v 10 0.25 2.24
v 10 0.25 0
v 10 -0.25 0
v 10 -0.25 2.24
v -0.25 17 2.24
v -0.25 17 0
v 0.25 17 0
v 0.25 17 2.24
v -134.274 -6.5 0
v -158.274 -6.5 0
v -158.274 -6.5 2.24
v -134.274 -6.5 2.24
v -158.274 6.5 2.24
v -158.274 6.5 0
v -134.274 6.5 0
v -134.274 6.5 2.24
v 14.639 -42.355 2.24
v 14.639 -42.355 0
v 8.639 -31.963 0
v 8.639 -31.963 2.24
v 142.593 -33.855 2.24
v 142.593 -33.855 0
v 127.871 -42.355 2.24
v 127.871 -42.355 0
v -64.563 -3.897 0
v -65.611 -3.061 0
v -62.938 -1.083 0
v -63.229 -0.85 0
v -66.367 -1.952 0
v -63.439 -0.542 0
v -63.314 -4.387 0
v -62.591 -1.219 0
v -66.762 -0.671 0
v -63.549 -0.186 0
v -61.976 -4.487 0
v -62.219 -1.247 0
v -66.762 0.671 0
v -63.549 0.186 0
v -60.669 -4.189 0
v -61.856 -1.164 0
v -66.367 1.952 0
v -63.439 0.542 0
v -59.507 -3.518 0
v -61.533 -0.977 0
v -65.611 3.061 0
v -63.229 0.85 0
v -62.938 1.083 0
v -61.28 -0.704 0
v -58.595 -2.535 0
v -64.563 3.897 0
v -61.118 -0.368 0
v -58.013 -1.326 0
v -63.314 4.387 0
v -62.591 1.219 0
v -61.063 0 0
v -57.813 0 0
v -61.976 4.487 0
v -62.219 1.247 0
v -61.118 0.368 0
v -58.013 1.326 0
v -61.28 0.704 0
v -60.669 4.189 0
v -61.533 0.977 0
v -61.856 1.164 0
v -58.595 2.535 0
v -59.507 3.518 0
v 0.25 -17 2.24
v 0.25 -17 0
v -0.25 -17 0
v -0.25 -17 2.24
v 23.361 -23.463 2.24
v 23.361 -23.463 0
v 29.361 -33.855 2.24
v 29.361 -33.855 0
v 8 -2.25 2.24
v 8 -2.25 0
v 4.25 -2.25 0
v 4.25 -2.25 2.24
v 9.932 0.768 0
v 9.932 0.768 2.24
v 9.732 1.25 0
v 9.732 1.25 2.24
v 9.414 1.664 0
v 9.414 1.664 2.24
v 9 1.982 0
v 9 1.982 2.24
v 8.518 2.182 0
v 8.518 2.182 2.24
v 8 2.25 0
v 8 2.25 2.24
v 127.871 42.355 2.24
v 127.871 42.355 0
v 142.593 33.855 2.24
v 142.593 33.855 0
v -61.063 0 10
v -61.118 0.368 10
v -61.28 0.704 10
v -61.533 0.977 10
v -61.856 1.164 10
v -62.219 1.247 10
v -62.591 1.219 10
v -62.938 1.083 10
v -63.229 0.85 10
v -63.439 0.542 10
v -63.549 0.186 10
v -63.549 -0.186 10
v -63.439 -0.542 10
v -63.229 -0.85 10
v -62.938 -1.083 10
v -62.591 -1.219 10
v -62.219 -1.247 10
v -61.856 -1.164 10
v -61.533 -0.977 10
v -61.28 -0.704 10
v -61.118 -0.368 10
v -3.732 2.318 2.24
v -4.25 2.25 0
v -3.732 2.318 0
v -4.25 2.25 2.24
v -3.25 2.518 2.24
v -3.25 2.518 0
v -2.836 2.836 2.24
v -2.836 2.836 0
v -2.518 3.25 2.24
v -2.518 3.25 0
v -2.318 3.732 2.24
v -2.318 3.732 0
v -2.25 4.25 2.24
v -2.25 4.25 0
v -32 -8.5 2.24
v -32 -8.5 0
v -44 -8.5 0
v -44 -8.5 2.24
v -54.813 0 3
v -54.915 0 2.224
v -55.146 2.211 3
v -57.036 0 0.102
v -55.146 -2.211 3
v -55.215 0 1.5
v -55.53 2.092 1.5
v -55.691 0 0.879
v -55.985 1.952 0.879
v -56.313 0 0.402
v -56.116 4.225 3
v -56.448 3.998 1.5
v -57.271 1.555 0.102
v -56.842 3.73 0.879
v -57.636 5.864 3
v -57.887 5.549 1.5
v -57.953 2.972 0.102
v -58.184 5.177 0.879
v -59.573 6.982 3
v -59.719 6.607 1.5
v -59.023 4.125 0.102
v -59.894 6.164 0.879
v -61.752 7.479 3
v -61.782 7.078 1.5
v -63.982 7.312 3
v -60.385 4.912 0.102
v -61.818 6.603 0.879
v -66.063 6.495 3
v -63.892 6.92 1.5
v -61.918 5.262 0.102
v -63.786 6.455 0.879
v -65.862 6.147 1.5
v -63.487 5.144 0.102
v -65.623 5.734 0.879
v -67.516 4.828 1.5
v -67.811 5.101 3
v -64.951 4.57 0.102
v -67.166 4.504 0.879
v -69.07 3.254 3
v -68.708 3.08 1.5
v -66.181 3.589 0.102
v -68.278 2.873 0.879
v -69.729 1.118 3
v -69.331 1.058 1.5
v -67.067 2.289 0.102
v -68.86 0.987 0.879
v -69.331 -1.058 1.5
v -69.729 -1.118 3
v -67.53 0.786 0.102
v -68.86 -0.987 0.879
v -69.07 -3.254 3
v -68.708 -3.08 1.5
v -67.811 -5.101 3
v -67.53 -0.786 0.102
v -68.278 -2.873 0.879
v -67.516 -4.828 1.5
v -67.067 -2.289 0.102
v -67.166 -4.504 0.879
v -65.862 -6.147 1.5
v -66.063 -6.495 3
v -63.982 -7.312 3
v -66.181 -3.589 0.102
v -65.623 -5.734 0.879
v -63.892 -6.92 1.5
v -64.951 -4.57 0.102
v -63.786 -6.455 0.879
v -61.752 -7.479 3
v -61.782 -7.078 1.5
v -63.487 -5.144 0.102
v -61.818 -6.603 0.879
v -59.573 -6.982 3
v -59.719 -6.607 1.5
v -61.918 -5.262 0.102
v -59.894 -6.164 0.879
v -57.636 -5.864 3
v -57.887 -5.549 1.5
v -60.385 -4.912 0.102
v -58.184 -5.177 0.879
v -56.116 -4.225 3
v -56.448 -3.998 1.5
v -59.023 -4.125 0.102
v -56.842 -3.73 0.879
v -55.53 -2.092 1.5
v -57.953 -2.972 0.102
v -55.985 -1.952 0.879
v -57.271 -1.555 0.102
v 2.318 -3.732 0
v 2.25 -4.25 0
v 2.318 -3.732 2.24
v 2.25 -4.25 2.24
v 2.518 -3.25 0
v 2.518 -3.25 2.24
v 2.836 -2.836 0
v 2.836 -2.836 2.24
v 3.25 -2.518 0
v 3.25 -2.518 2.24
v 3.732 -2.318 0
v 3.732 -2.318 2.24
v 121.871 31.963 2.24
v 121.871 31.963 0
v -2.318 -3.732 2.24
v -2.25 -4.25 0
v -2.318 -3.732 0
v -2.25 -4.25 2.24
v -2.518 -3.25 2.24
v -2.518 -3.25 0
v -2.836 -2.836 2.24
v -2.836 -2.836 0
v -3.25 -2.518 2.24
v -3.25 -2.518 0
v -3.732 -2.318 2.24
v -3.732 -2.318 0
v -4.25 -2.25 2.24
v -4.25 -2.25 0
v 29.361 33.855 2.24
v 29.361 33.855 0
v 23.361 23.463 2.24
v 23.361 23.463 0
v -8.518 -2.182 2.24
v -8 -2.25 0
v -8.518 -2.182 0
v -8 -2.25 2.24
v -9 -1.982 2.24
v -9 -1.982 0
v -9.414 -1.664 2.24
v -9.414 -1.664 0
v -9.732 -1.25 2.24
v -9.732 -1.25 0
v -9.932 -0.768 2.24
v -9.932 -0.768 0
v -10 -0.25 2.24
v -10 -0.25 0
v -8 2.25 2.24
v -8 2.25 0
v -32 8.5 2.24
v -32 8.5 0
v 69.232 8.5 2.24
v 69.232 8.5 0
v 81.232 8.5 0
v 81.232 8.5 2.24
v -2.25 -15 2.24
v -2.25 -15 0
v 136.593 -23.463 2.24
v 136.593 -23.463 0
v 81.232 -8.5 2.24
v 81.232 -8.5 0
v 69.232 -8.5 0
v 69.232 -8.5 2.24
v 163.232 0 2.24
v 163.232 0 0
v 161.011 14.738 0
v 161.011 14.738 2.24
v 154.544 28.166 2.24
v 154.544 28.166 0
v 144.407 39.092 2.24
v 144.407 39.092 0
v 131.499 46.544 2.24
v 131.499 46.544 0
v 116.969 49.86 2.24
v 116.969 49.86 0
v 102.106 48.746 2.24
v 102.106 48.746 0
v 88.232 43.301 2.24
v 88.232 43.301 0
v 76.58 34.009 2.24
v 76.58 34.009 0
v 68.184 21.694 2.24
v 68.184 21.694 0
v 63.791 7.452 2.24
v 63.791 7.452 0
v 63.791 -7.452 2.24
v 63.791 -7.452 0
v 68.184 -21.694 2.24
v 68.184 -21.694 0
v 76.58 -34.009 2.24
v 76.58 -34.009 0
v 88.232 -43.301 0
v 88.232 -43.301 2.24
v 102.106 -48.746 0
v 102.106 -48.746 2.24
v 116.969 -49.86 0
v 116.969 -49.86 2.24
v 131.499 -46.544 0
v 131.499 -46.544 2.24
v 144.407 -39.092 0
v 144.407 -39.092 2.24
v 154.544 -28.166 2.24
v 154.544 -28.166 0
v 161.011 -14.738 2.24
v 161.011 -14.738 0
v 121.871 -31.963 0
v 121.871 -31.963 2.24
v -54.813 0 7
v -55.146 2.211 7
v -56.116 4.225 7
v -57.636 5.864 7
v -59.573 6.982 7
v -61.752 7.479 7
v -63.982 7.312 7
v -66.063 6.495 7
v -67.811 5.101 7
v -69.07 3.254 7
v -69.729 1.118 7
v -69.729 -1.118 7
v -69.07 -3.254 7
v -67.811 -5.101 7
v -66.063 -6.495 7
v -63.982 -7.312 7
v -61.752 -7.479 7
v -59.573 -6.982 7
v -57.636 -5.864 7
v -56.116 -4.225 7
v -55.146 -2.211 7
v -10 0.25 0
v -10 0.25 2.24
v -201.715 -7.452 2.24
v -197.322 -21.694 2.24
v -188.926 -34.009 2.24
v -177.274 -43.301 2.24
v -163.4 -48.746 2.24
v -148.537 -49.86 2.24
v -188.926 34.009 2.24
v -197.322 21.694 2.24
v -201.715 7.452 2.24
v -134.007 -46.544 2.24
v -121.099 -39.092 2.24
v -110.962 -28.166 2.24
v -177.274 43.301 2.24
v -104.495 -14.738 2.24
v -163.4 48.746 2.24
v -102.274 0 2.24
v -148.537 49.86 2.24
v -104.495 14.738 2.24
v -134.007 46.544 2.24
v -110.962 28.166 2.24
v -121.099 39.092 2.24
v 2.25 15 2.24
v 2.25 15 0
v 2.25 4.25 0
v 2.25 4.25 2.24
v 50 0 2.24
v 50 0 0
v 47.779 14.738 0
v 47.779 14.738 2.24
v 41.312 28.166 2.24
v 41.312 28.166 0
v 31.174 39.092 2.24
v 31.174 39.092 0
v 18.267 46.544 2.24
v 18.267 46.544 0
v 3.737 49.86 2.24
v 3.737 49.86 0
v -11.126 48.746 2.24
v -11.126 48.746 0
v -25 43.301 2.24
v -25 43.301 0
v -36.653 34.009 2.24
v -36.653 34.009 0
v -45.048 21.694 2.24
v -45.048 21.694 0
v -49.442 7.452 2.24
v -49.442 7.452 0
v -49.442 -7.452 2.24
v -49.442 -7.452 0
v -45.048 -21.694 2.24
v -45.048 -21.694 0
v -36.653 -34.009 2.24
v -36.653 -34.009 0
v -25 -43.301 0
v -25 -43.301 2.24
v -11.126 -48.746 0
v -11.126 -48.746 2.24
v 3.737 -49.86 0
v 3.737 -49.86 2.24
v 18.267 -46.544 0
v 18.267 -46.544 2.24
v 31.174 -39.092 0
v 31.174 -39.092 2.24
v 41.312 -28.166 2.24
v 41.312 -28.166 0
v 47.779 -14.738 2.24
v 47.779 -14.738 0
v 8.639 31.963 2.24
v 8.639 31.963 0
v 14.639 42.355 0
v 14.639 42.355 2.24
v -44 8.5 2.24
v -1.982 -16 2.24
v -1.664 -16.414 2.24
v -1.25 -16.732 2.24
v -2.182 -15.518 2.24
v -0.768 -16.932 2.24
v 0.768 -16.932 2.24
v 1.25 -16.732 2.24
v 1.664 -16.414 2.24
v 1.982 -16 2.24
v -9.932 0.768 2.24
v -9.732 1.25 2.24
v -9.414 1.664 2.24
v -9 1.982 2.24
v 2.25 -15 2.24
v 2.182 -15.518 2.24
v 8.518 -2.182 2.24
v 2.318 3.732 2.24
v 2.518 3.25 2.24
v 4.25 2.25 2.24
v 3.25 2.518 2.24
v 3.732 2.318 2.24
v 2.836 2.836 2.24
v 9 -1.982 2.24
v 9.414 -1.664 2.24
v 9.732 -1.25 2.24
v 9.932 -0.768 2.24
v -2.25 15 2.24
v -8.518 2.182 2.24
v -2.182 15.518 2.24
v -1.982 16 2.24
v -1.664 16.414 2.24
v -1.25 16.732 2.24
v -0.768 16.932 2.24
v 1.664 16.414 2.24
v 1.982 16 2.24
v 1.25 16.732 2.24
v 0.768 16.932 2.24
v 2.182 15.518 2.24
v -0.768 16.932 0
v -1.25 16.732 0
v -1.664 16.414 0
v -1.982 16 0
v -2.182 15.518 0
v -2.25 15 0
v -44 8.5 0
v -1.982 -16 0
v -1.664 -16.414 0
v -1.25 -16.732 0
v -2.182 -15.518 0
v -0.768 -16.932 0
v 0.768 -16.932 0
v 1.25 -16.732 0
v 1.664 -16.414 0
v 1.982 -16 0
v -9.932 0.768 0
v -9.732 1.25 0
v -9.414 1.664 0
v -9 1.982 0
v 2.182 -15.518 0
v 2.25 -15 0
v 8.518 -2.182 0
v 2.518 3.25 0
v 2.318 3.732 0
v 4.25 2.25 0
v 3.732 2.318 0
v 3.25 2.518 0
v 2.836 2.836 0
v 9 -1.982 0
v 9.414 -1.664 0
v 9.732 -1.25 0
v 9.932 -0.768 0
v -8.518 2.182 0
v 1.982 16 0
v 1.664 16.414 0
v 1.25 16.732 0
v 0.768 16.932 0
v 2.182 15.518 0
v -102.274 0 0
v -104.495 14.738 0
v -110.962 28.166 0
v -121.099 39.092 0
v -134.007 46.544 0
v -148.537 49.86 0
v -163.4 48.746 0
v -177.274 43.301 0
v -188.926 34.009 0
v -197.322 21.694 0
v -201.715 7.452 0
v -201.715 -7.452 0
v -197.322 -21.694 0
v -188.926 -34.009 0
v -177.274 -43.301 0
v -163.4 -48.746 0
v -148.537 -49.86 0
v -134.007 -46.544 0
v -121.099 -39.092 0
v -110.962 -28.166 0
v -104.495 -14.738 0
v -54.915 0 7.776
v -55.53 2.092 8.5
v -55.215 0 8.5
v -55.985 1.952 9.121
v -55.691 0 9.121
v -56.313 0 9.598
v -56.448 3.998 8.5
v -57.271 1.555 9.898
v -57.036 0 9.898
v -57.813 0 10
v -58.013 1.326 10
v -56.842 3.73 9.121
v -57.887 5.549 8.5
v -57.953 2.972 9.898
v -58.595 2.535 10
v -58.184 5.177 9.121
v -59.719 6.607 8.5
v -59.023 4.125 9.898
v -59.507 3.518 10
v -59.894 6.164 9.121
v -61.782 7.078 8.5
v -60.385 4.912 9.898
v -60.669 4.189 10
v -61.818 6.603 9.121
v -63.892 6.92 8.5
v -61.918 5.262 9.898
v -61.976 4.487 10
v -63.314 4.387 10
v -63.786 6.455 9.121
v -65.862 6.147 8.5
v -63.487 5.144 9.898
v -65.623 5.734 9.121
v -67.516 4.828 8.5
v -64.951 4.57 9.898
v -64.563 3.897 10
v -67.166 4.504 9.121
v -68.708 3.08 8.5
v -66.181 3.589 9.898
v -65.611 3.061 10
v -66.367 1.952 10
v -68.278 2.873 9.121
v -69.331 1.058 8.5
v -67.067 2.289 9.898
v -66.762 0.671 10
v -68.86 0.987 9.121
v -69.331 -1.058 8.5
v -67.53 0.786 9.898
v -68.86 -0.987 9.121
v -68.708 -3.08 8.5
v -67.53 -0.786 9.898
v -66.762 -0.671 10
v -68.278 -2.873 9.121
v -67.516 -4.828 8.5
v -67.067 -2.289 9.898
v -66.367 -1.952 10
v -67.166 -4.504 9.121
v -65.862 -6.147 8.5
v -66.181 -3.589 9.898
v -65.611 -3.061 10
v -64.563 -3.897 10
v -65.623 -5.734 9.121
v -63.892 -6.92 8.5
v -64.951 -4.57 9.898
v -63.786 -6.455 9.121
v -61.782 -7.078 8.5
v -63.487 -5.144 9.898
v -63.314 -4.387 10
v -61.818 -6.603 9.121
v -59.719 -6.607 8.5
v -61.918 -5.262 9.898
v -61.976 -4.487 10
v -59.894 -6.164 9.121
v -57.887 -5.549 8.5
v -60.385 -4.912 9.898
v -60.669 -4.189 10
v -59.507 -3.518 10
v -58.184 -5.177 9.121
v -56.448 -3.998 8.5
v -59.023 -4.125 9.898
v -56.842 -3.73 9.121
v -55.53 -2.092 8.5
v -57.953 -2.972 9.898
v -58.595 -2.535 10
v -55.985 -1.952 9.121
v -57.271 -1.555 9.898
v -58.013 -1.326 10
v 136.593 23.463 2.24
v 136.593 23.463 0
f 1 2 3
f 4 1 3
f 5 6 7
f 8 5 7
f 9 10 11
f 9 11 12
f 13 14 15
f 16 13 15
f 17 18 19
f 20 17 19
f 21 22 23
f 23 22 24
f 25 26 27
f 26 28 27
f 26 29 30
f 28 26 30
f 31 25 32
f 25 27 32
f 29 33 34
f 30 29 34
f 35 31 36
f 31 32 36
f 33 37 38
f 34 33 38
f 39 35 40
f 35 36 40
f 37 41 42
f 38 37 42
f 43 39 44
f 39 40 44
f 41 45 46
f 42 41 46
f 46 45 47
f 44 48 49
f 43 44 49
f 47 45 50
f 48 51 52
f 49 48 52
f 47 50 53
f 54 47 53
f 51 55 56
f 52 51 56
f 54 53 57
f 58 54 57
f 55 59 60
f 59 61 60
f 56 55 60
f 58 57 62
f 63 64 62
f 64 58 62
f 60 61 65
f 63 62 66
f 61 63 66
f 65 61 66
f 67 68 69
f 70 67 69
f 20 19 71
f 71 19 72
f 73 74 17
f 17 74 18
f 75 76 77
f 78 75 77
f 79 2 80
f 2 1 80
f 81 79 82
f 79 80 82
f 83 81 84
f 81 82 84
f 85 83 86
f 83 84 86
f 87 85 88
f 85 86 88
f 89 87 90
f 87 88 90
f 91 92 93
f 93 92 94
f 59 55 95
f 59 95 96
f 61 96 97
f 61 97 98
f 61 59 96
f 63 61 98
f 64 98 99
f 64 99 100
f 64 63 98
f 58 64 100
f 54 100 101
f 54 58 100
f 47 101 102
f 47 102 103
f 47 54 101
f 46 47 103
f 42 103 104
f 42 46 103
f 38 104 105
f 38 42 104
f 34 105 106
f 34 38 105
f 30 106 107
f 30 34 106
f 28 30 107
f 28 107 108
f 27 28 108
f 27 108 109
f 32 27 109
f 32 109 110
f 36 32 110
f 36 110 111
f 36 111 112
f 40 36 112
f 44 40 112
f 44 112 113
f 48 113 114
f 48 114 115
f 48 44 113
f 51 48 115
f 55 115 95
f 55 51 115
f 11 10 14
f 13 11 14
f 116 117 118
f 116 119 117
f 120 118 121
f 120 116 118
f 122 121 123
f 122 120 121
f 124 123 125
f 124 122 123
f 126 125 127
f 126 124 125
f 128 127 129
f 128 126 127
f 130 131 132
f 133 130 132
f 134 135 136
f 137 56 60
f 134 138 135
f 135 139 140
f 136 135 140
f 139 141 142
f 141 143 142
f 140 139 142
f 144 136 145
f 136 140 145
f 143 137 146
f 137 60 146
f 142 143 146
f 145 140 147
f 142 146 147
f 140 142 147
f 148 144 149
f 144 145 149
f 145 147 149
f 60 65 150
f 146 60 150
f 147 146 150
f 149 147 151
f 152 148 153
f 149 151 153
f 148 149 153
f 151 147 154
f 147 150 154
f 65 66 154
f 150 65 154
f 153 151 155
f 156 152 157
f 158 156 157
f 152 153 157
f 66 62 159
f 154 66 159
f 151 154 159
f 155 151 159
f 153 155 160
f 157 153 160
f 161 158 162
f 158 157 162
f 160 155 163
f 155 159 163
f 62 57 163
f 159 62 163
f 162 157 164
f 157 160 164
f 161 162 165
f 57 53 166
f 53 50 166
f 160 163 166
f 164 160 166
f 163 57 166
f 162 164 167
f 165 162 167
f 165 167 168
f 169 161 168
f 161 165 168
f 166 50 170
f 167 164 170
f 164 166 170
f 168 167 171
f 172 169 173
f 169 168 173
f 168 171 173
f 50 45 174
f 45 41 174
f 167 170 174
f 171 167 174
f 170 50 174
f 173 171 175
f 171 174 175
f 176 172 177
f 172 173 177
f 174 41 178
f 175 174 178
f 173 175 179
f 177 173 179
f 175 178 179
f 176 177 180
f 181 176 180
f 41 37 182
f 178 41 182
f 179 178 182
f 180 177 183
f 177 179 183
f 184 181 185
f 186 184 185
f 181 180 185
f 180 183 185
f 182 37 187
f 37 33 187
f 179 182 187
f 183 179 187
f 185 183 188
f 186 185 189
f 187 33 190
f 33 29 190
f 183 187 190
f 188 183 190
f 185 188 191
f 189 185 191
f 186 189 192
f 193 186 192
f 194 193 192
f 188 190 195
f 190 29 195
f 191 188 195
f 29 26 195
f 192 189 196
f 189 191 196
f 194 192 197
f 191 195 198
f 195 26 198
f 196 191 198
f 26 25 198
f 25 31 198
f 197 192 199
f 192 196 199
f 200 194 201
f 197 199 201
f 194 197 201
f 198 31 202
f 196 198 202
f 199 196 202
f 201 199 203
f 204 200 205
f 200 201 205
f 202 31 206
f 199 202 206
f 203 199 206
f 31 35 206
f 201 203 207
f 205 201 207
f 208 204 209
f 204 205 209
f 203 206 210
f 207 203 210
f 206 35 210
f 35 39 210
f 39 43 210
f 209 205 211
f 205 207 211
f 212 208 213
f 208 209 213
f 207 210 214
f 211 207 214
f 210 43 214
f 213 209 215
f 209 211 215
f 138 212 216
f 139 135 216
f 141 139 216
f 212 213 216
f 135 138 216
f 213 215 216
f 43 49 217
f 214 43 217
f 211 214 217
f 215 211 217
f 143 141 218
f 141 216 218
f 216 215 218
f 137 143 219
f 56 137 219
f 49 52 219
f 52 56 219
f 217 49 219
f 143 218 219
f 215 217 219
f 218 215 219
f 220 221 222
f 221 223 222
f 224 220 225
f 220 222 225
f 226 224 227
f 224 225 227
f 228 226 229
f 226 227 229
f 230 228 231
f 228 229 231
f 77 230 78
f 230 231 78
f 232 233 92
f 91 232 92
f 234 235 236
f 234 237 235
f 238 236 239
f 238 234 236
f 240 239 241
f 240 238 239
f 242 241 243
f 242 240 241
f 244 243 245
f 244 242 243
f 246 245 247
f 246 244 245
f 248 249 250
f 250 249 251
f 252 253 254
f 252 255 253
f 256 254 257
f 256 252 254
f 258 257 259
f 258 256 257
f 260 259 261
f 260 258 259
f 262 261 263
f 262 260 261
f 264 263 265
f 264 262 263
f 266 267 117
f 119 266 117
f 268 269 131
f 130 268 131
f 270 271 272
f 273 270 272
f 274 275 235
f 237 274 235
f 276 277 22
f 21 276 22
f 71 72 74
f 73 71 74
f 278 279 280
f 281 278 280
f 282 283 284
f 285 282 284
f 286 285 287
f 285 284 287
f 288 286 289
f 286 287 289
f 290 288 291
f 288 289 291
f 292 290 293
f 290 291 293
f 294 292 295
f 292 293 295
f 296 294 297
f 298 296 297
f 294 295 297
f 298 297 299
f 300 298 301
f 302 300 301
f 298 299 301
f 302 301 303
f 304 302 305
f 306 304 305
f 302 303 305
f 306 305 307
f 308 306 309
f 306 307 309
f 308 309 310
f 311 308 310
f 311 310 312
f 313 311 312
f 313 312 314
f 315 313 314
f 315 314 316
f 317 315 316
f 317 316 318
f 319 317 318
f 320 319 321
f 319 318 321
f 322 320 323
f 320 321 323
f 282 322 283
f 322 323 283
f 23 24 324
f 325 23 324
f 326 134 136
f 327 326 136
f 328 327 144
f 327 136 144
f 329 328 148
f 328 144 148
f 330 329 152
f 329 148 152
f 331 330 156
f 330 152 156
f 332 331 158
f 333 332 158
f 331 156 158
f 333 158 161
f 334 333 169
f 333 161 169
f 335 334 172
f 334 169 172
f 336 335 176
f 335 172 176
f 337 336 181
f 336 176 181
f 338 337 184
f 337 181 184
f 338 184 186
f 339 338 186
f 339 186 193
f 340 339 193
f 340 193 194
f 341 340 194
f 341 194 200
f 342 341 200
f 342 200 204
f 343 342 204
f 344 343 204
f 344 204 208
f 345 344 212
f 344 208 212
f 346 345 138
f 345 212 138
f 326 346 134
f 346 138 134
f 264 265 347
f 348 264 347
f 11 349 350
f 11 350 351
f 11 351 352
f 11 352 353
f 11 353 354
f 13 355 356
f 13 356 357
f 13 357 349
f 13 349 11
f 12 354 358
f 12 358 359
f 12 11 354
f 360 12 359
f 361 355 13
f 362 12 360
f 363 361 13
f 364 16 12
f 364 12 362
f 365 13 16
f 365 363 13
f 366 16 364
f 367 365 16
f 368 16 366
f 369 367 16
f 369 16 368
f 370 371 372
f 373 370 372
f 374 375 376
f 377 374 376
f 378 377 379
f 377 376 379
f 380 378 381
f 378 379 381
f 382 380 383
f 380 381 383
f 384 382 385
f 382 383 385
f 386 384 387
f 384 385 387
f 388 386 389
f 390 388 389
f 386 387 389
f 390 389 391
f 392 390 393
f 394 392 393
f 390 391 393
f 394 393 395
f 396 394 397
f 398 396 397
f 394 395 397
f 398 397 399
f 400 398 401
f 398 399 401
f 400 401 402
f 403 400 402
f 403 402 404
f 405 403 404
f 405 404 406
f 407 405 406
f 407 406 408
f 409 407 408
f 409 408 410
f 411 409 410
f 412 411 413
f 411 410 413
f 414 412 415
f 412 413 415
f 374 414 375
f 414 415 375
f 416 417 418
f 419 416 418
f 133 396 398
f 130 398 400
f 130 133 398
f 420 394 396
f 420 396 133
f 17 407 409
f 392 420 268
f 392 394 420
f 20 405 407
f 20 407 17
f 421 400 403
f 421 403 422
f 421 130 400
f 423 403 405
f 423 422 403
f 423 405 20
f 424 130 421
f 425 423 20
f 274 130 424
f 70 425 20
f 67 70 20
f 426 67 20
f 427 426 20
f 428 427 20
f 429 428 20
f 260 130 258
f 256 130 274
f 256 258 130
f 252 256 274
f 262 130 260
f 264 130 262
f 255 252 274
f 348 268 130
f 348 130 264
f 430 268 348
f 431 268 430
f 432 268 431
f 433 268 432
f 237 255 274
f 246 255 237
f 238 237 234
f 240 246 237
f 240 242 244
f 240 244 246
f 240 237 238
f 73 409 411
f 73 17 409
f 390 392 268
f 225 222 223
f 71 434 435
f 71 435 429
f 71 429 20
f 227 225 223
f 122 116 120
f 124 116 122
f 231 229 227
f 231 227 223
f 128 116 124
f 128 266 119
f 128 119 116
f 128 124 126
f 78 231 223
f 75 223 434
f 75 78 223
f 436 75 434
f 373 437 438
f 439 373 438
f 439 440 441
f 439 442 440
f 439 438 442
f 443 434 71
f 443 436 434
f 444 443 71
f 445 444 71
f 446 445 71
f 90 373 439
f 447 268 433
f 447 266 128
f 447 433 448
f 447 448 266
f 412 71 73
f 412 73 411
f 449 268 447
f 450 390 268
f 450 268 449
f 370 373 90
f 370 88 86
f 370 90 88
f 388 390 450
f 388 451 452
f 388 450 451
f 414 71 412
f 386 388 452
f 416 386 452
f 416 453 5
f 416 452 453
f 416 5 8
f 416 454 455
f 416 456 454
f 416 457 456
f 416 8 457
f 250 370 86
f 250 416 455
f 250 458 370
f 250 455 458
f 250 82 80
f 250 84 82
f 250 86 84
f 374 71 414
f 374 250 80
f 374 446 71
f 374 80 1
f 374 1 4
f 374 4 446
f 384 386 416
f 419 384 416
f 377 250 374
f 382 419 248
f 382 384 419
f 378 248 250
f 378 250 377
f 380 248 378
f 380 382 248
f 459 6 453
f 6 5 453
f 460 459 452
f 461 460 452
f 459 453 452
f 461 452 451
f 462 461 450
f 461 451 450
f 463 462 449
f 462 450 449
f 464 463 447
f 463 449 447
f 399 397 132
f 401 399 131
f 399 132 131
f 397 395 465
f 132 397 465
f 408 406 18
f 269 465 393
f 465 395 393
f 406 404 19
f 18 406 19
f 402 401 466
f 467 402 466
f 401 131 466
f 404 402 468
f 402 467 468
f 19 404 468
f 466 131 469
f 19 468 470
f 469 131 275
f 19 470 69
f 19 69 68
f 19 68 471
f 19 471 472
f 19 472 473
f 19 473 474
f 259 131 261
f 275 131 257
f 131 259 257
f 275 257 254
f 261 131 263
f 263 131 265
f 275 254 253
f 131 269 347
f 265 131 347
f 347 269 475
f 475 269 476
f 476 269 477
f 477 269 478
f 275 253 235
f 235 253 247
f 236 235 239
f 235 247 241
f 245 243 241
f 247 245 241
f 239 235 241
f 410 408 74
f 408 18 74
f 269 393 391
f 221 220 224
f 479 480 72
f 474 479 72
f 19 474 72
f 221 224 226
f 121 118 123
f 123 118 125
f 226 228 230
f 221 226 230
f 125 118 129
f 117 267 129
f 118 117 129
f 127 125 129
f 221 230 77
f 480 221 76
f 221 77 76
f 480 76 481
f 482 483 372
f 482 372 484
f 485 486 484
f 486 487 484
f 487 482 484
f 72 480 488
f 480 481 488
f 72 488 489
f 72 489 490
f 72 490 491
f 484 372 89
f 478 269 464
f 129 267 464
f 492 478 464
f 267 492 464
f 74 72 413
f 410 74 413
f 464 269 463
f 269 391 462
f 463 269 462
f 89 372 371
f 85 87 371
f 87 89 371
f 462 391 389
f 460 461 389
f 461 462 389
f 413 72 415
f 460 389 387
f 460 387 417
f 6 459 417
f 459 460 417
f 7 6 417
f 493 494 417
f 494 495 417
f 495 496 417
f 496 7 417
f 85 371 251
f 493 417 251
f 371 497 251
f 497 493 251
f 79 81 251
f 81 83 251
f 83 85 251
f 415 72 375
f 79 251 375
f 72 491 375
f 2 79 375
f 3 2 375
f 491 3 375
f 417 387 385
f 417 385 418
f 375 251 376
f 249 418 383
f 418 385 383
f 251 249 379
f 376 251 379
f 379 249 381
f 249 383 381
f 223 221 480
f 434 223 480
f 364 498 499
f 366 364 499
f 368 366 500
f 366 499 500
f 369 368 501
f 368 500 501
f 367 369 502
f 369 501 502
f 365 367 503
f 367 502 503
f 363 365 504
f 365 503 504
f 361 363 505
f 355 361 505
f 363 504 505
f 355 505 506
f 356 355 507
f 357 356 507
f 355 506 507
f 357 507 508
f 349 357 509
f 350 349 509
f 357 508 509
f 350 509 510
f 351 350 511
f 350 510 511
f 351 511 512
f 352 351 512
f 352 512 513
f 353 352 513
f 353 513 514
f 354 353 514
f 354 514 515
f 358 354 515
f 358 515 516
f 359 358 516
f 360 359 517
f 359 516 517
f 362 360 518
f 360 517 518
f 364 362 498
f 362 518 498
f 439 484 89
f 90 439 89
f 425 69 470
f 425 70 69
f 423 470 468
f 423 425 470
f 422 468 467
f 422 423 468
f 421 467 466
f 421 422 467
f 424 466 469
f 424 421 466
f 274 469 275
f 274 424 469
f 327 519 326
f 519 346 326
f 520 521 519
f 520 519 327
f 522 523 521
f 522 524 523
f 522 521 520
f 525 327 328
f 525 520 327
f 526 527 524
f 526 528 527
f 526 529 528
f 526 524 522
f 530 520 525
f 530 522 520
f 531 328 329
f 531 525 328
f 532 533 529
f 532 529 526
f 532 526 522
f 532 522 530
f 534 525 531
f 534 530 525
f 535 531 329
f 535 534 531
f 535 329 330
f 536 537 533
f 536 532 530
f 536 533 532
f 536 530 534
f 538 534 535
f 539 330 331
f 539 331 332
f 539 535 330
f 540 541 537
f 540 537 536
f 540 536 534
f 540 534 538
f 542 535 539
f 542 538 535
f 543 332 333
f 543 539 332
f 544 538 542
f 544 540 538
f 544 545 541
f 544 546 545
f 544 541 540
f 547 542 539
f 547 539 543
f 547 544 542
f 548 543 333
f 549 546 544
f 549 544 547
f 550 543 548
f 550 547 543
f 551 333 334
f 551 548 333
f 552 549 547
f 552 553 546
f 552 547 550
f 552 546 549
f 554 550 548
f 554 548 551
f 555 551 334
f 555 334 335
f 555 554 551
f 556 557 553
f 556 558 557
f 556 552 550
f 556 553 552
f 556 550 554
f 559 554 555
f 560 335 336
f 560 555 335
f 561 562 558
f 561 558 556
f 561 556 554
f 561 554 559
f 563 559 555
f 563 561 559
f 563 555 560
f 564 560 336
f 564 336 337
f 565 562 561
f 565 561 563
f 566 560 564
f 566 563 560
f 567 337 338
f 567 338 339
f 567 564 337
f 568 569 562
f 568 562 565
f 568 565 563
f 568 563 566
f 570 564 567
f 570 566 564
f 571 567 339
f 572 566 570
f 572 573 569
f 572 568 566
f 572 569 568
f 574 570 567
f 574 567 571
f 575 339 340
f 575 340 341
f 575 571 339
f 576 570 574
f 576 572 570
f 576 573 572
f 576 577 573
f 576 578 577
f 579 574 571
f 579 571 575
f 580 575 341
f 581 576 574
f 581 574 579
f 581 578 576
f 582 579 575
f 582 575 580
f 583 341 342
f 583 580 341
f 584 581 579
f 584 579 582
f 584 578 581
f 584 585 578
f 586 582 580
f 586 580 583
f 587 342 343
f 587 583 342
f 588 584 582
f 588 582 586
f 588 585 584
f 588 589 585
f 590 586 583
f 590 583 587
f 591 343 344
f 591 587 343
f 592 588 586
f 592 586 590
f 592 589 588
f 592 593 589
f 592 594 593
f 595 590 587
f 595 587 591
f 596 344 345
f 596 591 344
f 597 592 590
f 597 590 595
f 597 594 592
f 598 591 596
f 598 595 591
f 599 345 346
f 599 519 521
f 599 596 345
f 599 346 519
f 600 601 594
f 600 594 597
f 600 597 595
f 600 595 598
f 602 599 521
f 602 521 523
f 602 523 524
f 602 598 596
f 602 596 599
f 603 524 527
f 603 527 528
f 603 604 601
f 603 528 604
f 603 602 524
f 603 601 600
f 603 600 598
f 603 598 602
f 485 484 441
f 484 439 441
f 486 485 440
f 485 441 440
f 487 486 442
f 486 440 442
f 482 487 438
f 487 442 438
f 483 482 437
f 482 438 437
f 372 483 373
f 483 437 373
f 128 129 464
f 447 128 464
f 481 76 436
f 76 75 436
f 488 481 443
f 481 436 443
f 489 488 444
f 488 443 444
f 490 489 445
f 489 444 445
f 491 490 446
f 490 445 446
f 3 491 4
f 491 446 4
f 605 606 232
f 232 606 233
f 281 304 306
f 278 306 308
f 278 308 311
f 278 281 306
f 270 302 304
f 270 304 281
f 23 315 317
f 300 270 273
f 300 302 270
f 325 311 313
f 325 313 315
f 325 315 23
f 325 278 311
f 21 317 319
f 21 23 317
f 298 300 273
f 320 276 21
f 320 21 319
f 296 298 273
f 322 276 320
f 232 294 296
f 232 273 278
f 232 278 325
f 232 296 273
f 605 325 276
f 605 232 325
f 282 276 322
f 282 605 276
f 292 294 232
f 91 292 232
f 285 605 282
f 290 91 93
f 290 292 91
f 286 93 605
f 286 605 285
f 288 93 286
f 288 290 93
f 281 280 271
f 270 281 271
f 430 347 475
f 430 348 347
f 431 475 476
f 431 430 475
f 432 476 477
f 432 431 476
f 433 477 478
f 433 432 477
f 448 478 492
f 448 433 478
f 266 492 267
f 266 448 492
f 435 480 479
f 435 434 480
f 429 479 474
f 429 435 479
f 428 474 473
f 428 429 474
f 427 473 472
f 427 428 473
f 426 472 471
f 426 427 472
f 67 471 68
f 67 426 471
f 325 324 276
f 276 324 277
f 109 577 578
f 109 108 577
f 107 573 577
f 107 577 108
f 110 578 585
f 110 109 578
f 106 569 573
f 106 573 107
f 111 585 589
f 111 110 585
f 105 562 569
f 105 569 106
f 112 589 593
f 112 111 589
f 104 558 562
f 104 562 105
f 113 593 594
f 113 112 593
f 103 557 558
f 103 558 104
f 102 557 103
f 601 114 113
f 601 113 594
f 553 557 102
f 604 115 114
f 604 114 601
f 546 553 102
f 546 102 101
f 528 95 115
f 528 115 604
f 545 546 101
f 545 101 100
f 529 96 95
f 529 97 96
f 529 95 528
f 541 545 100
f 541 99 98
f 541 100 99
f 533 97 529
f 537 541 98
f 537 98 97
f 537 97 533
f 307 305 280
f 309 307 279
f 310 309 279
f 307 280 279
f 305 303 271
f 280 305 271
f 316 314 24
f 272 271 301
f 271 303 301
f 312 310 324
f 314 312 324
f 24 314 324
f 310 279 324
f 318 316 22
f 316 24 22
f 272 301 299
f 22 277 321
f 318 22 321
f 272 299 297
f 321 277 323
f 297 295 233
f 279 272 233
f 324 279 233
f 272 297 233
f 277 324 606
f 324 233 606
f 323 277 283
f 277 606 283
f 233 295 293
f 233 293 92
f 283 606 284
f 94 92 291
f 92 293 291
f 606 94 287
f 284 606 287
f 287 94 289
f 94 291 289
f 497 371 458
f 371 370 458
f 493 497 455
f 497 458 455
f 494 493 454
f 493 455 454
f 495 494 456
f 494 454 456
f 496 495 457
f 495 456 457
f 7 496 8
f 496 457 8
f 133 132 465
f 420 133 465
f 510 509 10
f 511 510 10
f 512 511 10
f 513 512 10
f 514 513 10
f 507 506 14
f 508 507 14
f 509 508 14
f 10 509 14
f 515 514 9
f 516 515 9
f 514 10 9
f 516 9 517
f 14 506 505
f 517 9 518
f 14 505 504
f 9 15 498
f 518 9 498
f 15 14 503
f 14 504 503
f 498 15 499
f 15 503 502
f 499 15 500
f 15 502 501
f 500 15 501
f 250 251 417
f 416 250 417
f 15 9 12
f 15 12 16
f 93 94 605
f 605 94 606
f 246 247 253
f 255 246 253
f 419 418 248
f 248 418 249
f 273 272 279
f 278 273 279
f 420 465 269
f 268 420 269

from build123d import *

# Parameters (mm, degrees)
F0_R     = 50
F0_W     = 24
F0_H     = 13
F1_DEPTH = 2.24
F2_R     = 2
F0_R_2   = 7.5
F0_R_3   = 1.25
F3_DEPTH = 10
F4_R     = 3


with BuildPart() as f1:
    # F0 (on Top) → F1 (new body)
    with BuildSketch(Plane.XY):
        with Locations((-152.273851, 0)):
            Circle(F0_R)
        with Locations((-146.273851, 0)):
            Rectangle(F0_W, F0_H, mode=Mode.SUBTRACT)
        Circle(F0_R)
        Polygon((14.638784, -42.355118), (8.638784, -31.962813), (23.361216, -23.462813), (29.361216, -33.855118), align=None, mode=Mode.SUBTRACT)
        Polygon((-44, 8.5), (-32, 8.5), (-32, 7.5), (-32, -8.5), (-44, -8.5), (-44, 7.5), align=None, mode=Mode.SUBTRACT)
        Polygon((2.25, -17), (-2.25, -17), (-2.25, -2.25), (-10, -2.25), (-10, 2.25), (-2.25, 2.25), (-2.25, 17), (2.25, 17), (2.25, 2.25), (10, 2.25), (10, -2.25), (2.25, -2.25), align=None, mode=Mode.SUBTRACT)
        Polygon((29.361216, 33.855118), (23.361216, 23.462813), (8.638784, 31.962813), (14.638784, 42.355118), align=None, mode=Mode.SUBTRACT)
        with Locations((113.232195, 0)):
            Circle(F0_R)
        Polygon((127.870979, -42.355118), (121.870979, -31.962813), (136.593411, -23.462813), (142.593411, -33.855118), align=None, mode=Mode.SUBTRACT)
        Polygon((69.232195, -8.5), (69.232195, 7.5), (69.232195, 8.5), (81.232195, 8.5), (81.232195, 7.5), (81.232195, -8.5), align=None, mode=Mode.SUBTRACT)
        Polygon((136.593411, 23.462813), (121.870979, 31.962813), (127.870979, 42.355118), (142.593411, 33.855118), align=None, mode=Mode.SUBTRACT)
    extrude(amount=F1_DEPTH)

    # F2
    f2_edges = [f1.edges().sort_by_distance(p)[0] for p in [
        (2.25, 17, 1.12),
        (10, 2.25, 1.12),
        (2.25, 2.25, 1.12),
        (2.25, -2.25, 1.12),
        (2.25, -17, 1.12),
        (-2.25, 17, 1.12),
        (-2.25, 2.25, 1.12),
        (-10, 2.25, 1.12),
        (-2.25, -2.25, 1.12),
        (-10, -2.25, 1.12),
        (-2.25, -17, 1.12),
        (10, -2.25, 1.12),
    ]]
    fillet(f2_edges, radius=F2_R)


with BuildPart() as f3:
    # F0 (on Top) → F3 (new body)
    with BuildSketch(Plane.XY):
        with Locations((-62.312644, 0)):
            Circle(F0_R_2)
        with Locations((-62.312644, 0)):
            Circle(F0_R_3, mode=Mode.SUBTRACT)
    extrude(amount=F3_DEPTH)

    # F4
    f4_edges = [f3.edges().sort_by_distance(p)[0] for p in [
        (-69.812644, 0, 10),
        (-69.812644, 0, 0),
    ]]
    fillet(f4_edges, radius=F4_R)


solid = Compound([f1.part, f3.part])
